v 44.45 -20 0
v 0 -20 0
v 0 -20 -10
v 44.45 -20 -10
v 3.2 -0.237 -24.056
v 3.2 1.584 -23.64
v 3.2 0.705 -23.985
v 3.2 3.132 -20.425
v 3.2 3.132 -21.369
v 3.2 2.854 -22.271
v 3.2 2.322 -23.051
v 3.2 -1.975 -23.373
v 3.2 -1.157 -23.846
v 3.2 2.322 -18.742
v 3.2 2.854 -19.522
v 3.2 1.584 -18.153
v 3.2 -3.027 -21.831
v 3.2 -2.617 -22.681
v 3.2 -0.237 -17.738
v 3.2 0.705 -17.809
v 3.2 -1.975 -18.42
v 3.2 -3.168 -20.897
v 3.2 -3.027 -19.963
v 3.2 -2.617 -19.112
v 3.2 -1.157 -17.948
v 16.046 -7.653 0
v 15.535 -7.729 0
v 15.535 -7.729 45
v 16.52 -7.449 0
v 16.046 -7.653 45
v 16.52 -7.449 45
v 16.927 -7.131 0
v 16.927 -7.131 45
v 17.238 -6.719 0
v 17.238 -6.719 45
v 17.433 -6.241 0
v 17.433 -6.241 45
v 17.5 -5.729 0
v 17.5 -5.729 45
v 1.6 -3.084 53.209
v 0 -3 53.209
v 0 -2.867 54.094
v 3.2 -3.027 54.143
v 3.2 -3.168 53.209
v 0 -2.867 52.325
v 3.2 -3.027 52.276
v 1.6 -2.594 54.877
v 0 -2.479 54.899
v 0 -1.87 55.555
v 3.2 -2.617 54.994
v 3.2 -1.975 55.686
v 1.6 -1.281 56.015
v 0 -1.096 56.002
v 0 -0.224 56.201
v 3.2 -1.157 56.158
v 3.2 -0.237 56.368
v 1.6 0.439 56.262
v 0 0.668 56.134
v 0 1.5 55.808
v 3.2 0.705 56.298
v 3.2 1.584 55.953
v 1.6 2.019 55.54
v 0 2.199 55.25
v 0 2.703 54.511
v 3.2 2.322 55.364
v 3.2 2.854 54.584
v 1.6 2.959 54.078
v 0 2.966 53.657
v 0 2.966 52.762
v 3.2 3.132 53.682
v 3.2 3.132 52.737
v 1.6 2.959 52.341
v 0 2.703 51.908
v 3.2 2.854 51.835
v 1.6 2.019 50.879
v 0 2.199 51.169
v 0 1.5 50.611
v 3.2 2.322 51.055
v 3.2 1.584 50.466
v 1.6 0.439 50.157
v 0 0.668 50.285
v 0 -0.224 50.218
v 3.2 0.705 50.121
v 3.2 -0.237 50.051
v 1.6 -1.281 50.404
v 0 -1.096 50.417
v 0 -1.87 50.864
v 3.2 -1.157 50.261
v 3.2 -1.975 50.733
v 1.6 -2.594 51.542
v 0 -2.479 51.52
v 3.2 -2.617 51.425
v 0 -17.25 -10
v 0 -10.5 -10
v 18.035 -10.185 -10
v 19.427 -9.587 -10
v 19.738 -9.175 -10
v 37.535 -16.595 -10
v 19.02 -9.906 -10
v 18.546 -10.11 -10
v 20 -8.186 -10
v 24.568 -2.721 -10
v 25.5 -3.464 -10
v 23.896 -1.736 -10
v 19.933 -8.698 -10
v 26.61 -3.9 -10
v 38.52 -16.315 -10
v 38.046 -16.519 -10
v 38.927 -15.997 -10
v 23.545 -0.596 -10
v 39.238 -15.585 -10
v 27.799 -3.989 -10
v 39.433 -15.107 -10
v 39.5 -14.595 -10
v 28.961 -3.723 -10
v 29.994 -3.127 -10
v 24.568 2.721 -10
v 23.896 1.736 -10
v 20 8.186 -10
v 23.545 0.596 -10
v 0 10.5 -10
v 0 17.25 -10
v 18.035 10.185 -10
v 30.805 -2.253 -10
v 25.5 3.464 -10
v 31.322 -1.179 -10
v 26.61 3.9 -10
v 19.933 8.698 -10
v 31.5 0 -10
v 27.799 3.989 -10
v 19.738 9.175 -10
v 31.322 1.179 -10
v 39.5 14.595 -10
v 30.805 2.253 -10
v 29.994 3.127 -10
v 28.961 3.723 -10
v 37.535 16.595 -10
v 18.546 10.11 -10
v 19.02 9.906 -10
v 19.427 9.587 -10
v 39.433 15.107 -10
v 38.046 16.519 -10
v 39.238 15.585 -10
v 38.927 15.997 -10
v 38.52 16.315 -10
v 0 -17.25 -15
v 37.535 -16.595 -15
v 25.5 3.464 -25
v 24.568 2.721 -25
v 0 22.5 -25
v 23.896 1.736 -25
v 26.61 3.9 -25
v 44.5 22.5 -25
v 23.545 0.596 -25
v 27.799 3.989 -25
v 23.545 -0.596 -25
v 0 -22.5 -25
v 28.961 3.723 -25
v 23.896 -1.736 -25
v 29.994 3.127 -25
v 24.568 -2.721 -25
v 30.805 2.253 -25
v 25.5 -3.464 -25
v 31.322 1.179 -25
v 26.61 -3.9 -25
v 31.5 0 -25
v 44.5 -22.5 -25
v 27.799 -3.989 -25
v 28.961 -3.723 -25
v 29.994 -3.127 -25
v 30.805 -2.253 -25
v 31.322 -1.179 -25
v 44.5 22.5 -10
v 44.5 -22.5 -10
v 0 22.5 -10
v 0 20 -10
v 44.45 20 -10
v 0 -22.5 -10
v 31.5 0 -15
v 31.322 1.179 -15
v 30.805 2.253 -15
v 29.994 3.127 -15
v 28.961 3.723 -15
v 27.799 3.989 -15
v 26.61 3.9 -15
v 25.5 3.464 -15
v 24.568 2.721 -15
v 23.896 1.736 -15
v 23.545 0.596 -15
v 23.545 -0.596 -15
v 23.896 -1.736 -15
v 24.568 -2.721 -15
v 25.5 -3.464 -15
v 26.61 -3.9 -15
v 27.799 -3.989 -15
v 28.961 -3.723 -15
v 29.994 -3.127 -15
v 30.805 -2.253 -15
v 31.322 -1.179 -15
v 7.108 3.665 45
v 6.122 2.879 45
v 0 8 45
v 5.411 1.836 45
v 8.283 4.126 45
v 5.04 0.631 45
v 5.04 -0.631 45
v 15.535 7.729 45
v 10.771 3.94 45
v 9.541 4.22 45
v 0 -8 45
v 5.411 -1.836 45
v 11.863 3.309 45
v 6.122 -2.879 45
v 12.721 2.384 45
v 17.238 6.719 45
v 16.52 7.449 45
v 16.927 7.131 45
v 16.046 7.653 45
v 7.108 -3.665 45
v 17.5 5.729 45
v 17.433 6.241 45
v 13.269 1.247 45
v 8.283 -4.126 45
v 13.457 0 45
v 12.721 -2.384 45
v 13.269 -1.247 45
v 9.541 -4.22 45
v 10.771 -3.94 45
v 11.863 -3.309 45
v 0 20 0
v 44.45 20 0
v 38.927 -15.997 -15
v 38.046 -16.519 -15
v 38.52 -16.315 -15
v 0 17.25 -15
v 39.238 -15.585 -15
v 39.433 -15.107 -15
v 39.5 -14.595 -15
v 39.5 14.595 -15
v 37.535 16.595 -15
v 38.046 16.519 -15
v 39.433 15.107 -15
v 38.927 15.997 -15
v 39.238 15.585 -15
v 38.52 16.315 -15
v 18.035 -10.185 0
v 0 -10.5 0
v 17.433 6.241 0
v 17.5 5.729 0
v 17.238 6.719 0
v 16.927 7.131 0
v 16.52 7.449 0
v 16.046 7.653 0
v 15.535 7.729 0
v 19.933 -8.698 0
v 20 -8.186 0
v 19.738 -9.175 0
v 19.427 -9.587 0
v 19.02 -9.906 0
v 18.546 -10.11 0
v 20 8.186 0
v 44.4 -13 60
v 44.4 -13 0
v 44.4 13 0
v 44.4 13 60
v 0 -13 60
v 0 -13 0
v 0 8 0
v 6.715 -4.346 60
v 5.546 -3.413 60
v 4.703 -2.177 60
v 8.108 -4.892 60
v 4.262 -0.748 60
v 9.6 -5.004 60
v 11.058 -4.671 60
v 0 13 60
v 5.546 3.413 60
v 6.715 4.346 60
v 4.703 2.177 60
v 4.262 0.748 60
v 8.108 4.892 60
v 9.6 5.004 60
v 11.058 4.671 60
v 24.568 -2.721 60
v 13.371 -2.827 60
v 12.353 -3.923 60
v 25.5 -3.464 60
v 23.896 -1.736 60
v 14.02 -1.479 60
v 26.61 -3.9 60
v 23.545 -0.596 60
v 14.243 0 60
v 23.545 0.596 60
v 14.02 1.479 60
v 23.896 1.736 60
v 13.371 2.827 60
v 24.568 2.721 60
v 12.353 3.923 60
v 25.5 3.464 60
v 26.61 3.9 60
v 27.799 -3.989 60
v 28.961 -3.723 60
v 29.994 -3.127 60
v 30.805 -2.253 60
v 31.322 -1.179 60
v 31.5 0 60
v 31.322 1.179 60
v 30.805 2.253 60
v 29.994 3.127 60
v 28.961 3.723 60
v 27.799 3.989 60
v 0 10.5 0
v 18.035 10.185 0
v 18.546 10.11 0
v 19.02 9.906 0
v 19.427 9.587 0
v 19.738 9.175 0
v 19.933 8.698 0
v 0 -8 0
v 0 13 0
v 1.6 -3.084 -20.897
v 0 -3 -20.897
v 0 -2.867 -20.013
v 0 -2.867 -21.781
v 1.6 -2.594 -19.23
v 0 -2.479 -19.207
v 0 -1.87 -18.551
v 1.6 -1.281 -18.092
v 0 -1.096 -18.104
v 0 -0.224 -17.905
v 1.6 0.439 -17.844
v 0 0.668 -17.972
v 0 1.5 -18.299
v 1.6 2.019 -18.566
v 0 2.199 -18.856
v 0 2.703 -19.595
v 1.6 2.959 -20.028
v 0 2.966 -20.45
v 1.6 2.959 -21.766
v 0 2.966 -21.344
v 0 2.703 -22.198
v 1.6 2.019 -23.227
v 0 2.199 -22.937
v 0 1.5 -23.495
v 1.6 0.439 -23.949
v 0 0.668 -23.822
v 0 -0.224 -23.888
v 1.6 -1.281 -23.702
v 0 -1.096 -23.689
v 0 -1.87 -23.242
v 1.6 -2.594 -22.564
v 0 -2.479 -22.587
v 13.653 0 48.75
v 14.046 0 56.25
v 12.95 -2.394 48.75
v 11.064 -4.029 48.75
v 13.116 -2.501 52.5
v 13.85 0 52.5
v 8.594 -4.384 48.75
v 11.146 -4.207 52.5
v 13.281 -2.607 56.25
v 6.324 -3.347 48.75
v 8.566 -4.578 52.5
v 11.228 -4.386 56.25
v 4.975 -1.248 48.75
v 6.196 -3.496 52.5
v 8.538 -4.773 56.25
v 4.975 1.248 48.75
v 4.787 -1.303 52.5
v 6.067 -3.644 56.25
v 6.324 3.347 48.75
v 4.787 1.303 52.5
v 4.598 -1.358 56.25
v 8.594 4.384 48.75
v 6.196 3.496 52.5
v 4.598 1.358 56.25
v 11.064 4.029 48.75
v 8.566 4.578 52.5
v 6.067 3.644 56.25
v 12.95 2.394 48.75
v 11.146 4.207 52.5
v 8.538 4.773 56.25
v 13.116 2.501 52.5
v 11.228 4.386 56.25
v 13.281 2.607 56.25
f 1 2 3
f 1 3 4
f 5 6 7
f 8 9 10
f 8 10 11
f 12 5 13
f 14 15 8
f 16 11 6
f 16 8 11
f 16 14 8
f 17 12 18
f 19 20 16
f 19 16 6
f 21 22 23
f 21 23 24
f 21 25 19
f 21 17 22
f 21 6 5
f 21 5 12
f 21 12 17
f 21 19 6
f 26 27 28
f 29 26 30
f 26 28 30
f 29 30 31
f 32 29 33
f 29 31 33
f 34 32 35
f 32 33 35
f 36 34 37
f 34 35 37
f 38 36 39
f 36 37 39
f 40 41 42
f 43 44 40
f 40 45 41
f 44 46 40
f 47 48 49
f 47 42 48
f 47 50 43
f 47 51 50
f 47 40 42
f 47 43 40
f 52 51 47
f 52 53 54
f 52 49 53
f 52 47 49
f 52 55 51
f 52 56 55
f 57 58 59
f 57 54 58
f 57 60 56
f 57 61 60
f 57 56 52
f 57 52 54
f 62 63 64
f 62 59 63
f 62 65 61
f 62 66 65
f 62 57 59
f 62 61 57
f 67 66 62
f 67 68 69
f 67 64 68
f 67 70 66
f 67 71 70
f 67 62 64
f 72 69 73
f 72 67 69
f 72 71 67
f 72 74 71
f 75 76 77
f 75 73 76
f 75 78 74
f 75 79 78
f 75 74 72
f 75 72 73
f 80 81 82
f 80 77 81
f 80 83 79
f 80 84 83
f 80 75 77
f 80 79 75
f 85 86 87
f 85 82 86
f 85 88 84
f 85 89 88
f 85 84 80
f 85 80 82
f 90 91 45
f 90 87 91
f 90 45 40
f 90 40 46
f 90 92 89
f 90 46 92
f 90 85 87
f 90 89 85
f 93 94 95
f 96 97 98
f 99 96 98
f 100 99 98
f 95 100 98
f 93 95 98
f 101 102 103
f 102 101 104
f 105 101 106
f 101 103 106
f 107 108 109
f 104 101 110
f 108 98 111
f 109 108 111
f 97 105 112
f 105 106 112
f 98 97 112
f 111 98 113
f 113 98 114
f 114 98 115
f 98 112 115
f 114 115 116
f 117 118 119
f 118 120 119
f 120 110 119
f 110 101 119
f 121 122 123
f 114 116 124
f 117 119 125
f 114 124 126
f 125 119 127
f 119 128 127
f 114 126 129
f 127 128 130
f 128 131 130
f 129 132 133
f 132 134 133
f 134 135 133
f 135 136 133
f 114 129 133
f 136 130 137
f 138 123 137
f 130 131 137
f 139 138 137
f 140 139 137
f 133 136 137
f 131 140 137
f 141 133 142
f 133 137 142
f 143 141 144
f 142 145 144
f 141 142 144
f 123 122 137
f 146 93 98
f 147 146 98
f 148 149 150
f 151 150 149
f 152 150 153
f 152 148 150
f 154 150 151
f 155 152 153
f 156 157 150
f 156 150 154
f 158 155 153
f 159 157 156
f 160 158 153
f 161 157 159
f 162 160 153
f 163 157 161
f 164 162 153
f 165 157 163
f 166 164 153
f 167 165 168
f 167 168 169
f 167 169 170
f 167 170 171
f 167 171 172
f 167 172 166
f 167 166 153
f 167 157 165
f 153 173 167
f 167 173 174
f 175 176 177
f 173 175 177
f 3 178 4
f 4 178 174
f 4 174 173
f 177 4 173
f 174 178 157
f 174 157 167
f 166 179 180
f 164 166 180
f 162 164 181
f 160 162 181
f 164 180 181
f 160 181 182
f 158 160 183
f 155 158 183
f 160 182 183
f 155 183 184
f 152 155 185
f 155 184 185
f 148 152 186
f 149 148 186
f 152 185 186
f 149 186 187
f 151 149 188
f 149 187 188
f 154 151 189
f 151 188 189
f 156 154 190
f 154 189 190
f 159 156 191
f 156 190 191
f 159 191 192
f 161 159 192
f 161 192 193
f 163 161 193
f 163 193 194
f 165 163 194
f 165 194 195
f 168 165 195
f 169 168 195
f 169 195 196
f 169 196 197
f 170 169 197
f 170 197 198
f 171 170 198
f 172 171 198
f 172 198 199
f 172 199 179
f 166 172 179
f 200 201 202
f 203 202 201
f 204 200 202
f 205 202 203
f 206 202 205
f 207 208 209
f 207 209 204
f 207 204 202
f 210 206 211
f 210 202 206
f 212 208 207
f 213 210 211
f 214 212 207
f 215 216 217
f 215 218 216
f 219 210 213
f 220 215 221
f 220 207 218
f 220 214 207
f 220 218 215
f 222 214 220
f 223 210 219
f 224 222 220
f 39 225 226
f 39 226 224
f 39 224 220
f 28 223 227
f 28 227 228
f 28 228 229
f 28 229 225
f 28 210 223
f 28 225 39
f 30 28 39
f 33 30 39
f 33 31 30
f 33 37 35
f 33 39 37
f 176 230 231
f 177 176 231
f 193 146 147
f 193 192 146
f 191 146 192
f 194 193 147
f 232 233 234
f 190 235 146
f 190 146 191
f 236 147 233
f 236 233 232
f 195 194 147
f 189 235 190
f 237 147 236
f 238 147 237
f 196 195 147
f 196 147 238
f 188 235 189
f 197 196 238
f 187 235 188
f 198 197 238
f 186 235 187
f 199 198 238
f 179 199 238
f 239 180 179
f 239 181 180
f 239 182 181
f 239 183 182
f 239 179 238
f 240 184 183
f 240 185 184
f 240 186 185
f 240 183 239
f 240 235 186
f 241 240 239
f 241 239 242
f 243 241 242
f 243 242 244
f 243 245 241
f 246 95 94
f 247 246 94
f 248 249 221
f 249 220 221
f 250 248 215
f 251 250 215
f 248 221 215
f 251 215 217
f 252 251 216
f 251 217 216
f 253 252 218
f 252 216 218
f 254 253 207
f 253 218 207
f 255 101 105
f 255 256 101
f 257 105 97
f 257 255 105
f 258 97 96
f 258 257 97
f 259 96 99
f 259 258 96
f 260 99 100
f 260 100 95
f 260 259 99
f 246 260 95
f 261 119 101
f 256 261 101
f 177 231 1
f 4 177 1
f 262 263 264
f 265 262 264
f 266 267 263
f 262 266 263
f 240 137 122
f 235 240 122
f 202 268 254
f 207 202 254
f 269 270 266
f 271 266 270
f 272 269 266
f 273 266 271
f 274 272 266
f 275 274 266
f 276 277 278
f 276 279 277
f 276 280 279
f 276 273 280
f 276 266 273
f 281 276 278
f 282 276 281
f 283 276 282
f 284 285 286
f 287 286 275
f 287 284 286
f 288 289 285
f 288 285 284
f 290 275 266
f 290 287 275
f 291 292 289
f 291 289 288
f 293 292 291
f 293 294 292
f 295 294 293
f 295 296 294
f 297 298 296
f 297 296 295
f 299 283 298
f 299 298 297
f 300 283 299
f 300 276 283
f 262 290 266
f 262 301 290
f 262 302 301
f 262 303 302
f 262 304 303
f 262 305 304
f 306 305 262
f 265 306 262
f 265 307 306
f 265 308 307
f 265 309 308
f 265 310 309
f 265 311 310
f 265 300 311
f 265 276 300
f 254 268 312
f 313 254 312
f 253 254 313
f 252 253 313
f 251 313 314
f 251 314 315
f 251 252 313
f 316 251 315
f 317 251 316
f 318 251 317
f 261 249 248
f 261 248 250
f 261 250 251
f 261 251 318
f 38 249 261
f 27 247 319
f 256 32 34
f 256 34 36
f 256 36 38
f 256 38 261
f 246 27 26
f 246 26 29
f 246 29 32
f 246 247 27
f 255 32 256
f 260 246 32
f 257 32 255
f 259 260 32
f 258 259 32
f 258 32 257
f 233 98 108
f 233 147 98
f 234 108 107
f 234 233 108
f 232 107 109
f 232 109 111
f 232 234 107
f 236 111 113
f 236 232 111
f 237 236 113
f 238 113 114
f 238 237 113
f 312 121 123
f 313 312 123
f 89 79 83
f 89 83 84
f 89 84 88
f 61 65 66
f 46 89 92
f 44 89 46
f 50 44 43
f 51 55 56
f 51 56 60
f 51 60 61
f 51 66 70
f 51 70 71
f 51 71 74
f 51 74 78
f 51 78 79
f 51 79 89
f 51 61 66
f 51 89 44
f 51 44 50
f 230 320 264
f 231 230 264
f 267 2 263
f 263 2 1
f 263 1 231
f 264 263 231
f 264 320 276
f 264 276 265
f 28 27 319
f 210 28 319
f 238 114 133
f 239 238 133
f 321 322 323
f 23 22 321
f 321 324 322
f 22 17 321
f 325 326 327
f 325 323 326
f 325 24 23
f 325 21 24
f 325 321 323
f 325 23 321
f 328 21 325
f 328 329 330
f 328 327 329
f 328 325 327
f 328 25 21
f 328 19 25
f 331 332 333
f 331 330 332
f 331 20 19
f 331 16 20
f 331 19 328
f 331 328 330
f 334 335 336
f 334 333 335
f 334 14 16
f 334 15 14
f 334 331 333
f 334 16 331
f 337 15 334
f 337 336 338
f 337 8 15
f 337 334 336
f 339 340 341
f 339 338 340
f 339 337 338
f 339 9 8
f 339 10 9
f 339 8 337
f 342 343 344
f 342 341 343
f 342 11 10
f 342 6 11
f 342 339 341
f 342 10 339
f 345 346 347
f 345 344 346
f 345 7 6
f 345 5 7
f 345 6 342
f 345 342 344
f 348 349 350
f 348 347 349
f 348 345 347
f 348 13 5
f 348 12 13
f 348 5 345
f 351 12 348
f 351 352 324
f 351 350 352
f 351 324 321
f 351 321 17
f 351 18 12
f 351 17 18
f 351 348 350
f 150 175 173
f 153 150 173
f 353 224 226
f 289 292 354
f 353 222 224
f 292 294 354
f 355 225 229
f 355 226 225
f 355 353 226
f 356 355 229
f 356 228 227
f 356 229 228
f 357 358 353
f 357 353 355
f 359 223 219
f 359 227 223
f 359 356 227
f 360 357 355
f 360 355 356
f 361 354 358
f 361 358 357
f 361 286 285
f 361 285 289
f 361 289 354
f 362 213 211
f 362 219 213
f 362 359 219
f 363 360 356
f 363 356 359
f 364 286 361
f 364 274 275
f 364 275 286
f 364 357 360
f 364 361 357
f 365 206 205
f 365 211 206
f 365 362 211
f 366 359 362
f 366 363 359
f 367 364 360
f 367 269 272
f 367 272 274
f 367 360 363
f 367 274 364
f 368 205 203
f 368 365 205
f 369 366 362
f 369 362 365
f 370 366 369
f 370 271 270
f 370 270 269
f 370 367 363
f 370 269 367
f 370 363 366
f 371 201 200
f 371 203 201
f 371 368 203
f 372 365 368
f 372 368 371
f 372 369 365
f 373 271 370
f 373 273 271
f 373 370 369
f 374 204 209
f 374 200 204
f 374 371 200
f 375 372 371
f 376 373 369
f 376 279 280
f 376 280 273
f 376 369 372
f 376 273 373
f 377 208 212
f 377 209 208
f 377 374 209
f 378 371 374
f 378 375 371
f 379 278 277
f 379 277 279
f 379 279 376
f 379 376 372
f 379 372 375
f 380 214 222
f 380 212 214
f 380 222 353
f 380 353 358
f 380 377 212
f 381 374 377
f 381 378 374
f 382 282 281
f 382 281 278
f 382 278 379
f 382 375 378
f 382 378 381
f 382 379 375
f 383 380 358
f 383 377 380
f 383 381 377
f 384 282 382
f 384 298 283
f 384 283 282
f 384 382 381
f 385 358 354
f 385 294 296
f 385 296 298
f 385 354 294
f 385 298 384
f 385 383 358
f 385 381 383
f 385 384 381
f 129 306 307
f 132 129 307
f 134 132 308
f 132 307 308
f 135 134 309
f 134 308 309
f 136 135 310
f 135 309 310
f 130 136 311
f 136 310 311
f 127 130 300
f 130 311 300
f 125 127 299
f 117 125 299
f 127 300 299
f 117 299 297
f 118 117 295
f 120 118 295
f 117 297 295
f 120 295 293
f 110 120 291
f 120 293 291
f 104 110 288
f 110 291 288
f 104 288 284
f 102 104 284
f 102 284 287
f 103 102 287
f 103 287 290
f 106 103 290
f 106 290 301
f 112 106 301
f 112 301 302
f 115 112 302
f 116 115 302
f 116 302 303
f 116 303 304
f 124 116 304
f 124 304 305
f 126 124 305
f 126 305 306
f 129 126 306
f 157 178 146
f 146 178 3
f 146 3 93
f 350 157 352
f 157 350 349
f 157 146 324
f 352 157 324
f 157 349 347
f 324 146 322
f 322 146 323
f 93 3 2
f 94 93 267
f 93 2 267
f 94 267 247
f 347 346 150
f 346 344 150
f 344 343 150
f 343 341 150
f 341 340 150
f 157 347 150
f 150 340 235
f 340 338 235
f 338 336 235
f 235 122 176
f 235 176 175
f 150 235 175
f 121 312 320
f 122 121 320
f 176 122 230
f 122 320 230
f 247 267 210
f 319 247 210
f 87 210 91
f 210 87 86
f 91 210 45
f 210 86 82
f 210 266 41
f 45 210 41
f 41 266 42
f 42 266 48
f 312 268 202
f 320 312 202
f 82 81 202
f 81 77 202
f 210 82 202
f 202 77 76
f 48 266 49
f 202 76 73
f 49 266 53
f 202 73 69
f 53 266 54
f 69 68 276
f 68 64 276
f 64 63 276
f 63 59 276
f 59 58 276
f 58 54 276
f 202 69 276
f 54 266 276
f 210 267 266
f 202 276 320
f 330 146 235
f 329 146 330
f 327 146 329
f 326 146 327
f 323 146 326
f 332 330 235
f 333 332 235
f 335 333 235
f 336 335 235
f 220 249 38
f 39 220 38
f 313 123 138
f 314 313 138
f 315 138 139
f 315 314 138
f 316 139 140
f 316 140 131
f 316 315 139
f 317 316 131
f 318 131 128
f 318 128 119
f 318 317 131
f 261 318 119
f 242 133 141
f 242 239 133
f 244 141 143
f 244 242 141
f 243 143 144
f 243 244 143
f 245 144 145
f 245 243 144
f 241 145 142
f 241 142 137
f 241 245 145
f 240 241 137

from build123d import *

# Parameters (mm, degrees)
F0_W      = 88.8
F0_H      = 26
F1_DEPTH  = 60
F3_DEPTH  = 45
F4_R      = 2
F5_W      = 88.9
F5_H      = 40
F6_DEPTH  = 10
F8_DEPTH  = 10
F9_R      = 2
F10_W     = 89
F10_H     = 45
F11_DEPTH = 15
F13_DEPTH = 5
F14_R     = 2
F15_R     = 4.6723110677
F15_R_2   = 4
F16_DEPTH = 85.001
F17_W     = 79.5239582658
F17_H     = 118.802215904
F18_DEPTH = 80
F19_R     = 3
F20_DEPTH = 3.2
F20_TAPER = -3
F21_R     = 4.232200224
F22_DEPTH = 25
F22_TAPER = -3


with BuildPart() as f1:
    # F0 (on Top) → F1 (new body)
    with BuildSketch(Plane.XY):
        Rectangle(F0_W, F0_H)
    extrude(amount=F1_DEPTH)

    # F2 (on face) → F3 (cut)
    with BuildSketch(Plane(origin=(0, 0, 0), x_dir=(1, 0, 0), z_dir=(0, 0, -1))):
        Polygon((-17.5, -7.6945363638), (0, -8), (17.5, -7.6945363638), (17.5, 7.6945363638), (0, 8), (-17.5, 7.6945363638), align=None)
    extrude(amount=-F3_DEPTH, mode=Mode.SUBTRACT)

    # F4
    f4_edges = [f1.edges().sort_by_distance(p)[0] for p in [
        (-17.5, 7.694536, 22.5),
        (-17.5, -7.694536, 22.5),
        (17.5, -7.694536, 22.5),
        (17.5, 7.694536, 22.5),
    ]]
    fillet(f4_edges, radius=F4_R)

    # F5 (on face) → F6 (join)
    with BuildSketch(Plane(origin=(0, 0, 0), x_dir=(1, 0, 0), z_dir=(0, 0, -1))):
        Rectangle(F5_W, F5_H)
    extrude(amount=F6_DEPTH)

    # F7 (on face) → F8 (cut)
    with BuildSketch(Plane(origin=(0, 0, -10), x_dir=(1, 0, 0), z_dir=(0, 0, -1))):
        Polygon((-20, -10.1508987014), (0, -10.5), (20, -10.1508987014), (20, 10.1508987014), (0, 10.5), (-20, 10.1508987014), align=None)
    extrude(amount=-F8_DEPTH, mode=Mode.SUBTRACT)

    # F9
    f9_edges = [f1.edges().sort_by_distance(p)[0] for p in [
        (-20, 10.150899, -5),
        (-20, -10.150899, -5),
        (20, 10.150899, -5),
        (20, -10.150899, -5),
    ]]
    fillet(f9_edges, radius=F9_R)

    # F10 (on face) → F11 (join)
    with BuildSketch(Plane(origin=(0, 0, -10), x_dir=(1, 0, 0), z_dir=(0, 0, -1))):
        Rectangle(F10_W, F10_H)
    extrude(amount=F11_DEPTH)

    # F12 (on face) → F13 (cut)
    with BuildSketch(Plane.XY.offset(-10)):
        Polygon((-39.5, -16.5605249353), (0, -17.25), (39.5, -16.5605249353), (39.5, 16.5605249353), (0, 17.25), (-39.5, 16.5605249353), align=None)
    extrude(amount=-F13_DEPTH, mode=Mode.SUBTRACT)

    # F14
    f14_edges = [f1.edges().sort_by_distance(p)[0] for p in [
        (-39.5, 16.560525, -12.5),
        (-39.5, -16.560525, -12.5),
        (39.5, -16.560525, -12.5),
        (39.5, 16.560525, -12.5),
    ]]
    fillet(f14_edges, radius=F14_R)

    # F15 (on face) → F16 (cut, through all)
    with BuildSketch(Plane.XY.offset(60)):
        with Locations((-27.5, 0)):
            Circle(F15_R)
        with Locations((27.5, 0)):
            Circle(F15_R_2)
    extrude(amount=-F16_DEPTH, mode=Mode.SUBTRACT)

    # F17 (on Right) → F18 (cut)
    with BuildSketch(Plane.YZ):
        with Locations((3.9665214717, 9.8679382354)):
            Rectangle(F17_W, F17_H)
    extrude(amount=-F18_DEPTH, mode=Mode.SUBTRACT)

    # F19 (on face) → F20 (cut)
    with BuildSketch(Plane(origin=(0, 0, 0), x_dir=(0, -1, 0), z_dir=(-1, 0, 0))):
        with Locations((0, 53.2094612718)):
            Circle(F19_R)
        with Locations((0, -20.896807313)):
            Circle(F19_R)
    extrude(amount=-F20_DEPTH, taper=F20_TAPER, mode=Mode.SUBTRACT)

    # F21 (on face) → F22 (cut)
    with BuildSketch(Plane(origin=(0, 0, 45), x_dir=(1, 0, 0), z_dir=(0, 0, -1))):
        with Locations((9.2245656997, 0)):
            Circle(F21_R)
    extrude(amount=-F22_DEPTH, taper=F22_TAPER, mode=Mode.SUBTRACT)


solid = f1.part
